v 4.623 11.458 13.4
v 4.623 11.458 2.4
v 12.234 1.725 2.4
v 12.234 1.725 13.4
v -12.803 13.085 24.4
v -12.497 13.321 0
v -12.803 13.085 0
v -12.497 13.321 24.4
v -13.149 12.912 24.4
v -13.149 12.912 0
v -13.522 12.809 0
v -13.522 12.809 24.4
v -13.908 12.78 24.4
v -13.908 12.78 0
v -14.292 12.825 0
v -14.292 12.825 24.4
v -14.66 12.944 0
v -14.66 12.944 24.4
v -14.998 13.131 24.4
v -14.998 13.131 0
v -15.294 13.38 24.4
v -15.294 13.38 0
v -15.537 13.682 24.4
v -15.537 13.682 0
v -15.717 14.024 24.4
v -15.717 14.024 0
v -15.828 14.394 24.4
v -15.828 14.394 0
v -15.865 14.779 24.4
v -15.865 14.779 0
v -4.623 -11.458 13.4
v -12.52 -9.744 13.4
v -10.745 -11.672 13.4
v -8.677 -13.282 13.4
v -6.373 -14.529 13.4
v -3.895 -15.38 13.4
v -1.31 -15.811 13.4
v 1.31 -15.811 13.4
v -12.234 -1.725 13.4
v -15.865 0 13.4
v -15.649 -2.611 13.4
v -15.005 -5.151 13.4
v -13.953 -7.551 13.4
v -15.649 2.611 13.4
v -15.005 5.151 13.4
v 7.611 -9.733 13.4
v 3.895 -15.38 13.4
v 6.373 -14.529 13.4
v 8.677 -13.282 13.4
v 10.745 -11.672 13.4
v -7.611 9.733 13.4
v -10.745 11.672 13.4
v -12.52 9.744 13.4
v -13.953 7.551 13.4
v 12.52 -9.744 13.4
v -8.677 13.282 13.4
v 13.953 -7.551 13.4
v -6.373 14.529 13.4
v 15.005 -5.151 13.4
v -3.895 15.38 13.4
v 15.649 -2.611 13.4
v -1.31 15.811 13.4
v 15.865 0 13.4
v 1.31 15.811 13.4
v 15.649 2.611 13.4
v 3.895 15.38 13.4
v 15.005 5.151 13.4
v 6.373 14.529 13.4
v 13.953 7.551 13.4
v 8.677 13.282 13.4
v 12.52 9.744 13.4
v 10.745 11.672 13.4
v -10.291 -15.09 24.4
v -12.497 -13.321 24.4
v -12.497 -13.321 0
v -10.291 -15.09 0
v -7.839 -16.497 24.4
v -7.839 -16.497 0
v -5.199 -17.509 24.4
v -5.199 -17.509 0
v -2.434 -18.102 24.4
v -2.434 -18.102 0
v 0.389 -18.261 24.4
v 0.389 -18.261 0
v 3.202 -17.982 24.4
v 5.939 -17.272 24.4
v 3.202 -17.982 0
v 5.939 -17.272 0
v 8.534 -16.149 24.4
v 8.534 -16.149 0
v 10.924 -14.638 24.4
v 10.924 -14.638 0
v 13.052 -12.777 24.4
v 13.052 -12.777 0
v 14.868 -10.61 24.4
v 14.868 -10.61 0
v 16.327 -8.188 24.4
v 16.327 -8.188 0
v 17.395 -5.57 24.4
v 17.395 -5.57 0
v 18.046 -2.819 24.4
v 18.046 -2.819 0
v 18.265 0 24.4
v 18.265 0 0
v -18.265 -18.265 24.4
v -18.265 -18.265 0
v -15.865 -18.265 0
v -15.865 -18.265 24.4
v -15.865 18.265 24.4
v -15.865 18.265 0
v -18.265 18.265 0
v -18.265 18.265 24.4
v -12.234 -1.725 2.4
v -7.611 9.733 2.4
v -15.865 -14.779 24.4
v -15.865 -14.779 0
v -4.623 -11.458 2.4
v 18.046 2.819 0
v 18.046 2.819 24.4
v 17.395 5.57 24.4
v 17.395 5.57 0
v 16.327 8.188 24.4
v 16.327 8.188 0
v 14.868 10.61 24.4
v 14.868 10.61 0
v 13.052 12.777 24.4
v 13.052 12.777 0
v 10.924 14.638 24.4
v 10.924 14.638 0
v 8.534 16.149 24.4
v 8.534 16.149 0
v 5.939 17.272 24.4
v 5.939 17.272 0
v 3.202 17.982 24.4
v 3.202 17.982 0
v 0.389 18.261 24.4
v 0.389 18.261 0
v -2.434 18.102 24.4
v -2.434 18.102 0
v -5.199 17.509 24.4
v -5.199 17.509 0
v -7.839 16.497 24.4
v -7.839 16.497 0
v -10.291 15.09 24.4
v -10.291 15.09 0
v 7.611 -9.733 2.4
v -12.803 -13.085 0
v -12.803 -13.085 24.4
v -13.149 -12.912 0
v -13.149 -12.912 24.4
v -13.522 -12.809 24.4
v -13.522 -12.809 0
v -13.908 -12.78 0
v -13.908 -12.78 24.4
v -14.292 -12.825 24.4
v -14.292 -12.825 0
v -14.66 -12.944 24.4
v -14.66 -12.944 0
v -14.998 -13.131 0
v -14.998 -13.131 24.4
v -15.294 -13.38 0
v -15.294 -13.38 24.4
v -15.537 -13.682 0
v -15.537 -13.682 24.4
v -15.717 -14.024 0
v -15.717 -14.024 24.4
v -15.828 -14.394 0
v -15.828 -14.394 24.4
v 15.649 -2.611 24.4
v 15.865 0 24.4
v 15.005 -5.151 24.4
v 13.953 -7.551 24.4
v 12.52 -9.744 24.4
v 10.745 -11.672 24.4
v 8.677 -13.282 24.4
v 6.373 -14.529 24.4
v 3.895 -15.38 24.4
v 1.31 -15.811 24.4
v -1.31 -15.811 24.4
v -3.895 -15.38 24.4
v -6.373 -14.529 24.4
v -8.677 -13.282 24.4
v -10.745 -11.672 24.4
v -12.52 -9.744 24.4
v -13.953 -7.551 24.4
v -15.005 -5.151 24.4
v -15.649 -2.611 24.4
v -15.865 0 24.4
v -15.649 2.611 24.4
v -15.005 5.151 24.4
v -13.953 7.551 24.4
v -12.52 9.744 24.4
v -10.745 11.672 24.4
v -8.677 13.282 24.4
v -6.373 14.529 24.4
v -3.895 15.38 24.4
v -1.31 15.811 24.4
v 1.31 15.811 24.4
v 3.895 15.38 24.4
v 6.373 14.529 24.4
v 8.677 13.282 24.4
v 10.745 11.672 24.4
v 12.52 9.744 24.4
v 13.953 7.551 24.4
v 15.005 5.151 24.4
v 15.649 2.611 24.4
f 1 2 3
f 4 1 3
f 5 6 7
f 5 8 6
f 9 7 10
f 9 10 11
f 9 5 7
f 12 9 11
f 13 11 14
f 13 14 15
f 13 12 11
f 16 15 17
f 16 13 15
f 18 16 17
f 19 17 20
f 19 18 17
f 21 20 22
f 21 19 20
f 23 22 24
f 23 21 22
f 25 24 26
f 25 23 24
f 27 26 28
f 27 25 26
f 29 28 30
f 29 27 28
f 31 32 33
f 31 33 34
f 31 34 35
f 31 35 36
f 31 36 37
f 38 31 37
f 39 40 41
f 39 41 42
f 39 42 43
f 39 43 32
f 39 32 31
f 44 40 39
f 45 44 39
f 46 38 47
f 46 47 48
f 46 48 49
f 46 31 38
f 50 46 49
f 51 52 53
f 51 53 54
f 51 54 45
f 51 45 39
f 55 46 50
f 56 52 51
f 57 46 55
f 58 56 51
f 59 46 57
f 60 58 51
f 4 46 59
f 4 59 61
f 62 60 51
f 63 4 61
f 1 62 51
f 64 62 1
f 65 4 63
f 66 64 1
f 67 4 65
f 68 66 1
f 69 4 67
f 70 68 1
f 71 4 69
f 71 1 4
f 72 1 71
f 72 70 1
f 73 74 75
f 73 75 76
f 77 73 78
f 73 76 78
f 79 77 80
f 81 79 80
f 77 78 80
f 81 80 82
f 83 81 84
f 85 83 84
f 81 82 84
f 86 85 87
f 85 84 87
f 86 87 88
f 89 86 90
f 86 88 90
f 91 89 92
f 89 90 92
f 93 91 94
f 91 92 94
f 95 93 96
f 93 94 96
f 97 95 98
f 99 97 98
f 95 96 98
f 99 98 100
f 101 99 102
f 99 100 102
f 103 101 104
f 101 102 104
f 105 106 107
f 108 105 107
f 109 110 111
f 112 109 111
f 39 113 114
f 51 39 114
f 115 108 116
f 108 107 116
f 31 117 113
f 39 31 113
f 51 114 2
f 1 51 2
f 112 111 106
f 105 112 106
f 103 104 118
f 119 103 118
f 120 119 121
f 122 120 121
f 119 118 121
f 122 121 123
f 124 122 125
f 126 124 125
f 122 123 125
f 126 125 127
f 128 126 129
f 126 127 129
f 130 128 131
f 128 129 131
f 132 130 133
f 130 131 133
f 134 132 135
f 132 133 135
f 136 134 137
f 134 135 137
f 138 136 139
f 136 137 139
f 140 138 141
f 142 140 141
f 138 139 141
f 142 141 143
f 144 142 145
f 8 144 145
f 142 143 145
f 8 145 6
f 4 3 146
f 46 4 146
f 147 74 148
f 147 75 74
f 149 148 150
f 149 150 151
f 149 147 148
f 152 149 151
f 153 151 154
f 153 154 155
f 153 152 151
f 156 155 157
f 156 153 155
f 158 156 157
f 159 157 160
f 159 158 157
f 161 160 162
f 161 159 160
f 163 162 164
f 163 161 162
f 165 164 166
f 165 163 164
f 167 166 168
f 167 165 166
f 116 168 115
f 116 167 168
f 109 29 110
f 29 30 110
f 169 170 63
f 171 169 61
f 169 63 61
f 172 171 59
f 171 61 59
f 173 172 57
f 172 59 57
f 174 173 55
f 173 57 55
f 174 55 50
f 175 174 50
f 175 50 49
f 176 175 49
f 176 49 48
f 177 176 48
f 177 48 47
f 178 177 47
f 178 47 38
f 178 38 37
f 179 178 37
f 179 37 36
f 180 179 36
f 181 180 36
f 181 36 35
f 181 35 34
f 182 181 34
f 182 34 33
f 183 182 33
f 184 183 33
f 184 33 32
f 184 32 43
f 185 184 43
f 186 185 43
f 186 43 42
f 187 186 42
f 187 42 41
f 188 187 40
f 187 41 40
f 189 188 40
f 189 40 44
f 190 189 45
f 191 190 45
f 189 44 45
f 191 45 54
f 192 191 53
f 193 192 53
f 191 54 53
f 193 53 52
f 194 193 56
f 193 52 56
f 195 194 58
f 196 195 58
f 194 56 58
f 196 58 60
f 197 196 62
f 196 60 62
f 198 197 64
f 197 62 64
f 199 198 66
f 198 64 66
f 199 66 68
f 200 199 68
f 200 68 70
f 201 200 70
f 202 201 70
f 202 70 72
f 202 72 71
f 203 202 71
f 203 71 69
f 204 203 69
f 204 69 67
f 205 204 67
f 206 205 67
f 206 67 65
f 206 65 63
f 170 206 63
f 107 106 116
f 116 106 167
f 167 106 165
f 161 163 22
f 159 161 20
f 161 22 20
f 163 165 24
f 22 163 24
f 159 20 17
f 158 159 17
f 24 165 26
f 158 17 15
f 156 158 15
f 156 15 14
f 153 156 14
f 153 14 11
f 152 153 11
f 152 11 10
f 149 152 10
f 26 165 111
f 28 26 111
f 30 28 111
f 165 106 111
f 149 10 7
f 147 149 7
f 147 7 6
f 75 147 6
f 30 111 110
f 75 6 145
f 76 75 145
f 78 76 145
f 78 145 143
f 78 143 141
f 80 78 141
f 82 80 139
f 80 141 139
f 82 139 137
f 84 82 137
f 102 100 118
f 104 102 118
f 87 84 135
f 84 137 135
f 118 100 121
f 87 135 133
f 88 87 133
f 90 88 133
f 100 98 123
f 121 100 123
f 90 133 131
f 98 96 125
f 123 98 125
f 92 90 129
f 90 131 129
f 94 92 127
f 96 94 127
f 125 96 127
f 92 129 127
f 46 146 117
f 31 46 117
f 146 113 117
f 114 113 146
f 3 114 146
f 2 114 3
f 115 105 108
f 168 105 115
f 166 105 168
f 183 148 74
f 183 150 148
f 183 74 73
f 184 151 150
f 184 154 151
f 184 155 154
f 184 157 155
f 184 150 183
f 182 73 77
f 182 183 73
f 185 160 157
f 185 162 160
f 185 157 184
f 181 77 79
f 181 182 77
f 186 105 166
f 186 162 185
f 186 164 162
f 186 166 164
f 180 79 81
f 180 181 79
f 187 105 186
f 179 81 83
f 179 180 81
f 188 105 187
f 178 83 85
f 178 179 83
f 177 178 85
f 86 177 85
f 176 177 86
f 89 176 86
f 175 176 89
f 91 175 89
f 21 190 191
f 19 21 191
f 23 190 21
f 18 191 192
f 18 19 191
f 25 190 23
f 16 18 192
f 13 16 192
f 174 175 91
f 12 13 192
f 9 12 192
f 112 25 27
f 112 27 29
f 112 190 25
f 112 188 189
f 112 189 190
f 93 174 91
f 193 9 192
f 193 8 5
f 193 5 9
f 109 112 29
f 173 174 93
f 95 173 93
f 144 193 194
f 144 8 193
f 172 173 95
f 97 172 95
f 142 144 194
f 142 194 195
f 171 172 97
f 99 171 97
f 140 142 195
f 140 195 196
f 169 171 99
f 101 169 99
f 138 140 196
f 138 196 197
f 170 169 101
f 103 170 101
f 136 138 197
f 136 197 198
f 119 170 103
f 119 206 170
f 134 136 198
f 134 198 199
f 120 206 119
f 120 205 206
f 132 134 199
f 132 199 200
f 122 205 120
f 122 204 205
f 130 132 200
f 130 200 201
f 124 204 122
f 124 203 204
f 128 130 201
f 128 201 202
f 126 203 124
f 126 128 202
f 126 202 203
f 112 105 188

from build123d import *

# Parameters (mm, degrees)
F3_DEPTH = 24.4
F4_DEPTH = 2.4
F5_DEPTH = 13.4
F6_R     = 2


with BuildPart() as f3:
    # F2 (on Top) → F3 (new body)
    with BuildSketch(Plane.XY):
        with BuildLine():
            Line((-15.865, -9.0505248467), (-15.865, 0))
            Line((-15.865, 0), (-15.865, 9.0505248467))
            ThreePointArc((-15.865, 9.0505248467), (-17.6548074189, 4.68166637), (-18.265, 0))
            ThreePointArc((-18.265, 0), (-17.6548074189, -4.68166637), (-15.865, -9.0505248467))
        make_face()
        with BuildLine():
            ThreePointArc((-18.265, 0), (-17.6548074189, 4.68166637), (-15.865, 9.0505248467))
            Line((-15.865, 9.0505248467), (-15.865, 18.265))
            Line((-15.865, 18.265), (-18.265, 18.265))
            Line((-18.265, 18.265), (-18.265, 0))
        make_face()
        with BuildLine():
            Line((-15.865, -18.265), (-15.865, -9.0505248467))
            ThreePointArc((-15.865, -9.0505248467), (-17.6548074189, -4.68166637), (-18.265, 0))
            Line((-18.265, 0), (-18.265, -18.265))
            Line((-18.265, -18.265), (-15.865, -18.265))
        make_face()
        with BuildLine():
            Line((-15.865, 9.0505248467), (-15.865, 0))
            Line((-15.865, 0), (-15.865, -9.0505248467))
            ThreePointArc((-15.865, -9.0505248467), (4.68166637, -17.6548074189), (18.265, 0))
            ThreePointArc((18.265, 0), (4.68166637, 17.6548074189), (-15.865, 9.0505248467))
        make_face()
        with BuildLine():
            ThreePointArc((-15.865, 0), (0, 15.865), (15.865, 0))
            ThreePointArc((15.865, 0), (0, -15.865), (-15.865, 0))
        make_face(mode=Mode.SUBTRACT)
    extrude(amount=F3_DEPTH)

    # F2 (on Top) → F4 (join)
    with BuildSketch(Plane.XY):
        with BuildLine():
            Line((-15.865, 9.0505248467), (-15.865, 0))
            Line((-15.865, 0), (-15.865, -9.0505248467))
            ThreePointArc((-15.865, -9.0505248467), (4.68166637, -17.6548074189), (18.265, 0))
            ThreePointArc((18.265, 0), (4.68166637, 17.6548074189), (-15.865, 9.0505248467))
        make_face()
        with BuildLine():
            ThreePointArc((-15.865, 0), (0, 15.865), (15.865, 0))
            ThreePointArc((15.865, 0), (0, -15.865), (-15.865, 0))
        make_face(mode=Mode.SUBTRACT)
        with BuildLine():
            ThreePointArc((-15.865, 0), (0, -15.865), (15.865, 0))
            ThreePointArc((15.865, 0), (0, 15.865), (-15.865, 0))
        make_face()
        Polygon((-7.6111814104, 9.7325870595), (4.6230769329, 11.457769984), (12.2342583433, 1.7251829245), (7.6111814104, -9.7325870595), (-4.6230769329, -11.457769984), (-12.2342583433, -1.7251829245), align=None, mode=Mode.SUBTRACT)
        Polygon((12.2342583433, 1.7251829245), (4.6230769329, 11.457769984), (-7.6111814104, 9.7325870595), (-12.2342583433, -1.7251829245), (-4.6230769329, -11.457769984), (7.6111814104, -9.7325870595), align=None)
    extrude(amount=F4_DEPTH)

    # F2 (on Top) → F5 (join)
    with BuildSketch(Plane.XY):
        with BuildLine():
            ThreePointArc((-15.865, 0), (0, -15.865), (15.865, 0))
            ThreePointArc((15.865, 0), (0, 15.865), (-15.865, 0))
        make_face()
        Polygon((-7.6111814104, 9.7325870595), (4.6230769329, 11.457769984), (12.2342583433, 1.7251829245), (7.6111814104, -9.7325870595), (-4.6230769329, -11.457769984), (-12.2342583433, -1.7251829245), align=None, mode=Mode.SUBTRACT)
    extrude(amount=F5_DEPTH)

    # F6
    f6_edges = [f3.edges().sort_by_distance(p)[0] for p in [
        (-15.865, -9.050525, 12.2),
        (-15.865, 9.050525, 12.2),
    ]]
    fillet(f6_edges, radius=F6_R)


solid = f3.part
